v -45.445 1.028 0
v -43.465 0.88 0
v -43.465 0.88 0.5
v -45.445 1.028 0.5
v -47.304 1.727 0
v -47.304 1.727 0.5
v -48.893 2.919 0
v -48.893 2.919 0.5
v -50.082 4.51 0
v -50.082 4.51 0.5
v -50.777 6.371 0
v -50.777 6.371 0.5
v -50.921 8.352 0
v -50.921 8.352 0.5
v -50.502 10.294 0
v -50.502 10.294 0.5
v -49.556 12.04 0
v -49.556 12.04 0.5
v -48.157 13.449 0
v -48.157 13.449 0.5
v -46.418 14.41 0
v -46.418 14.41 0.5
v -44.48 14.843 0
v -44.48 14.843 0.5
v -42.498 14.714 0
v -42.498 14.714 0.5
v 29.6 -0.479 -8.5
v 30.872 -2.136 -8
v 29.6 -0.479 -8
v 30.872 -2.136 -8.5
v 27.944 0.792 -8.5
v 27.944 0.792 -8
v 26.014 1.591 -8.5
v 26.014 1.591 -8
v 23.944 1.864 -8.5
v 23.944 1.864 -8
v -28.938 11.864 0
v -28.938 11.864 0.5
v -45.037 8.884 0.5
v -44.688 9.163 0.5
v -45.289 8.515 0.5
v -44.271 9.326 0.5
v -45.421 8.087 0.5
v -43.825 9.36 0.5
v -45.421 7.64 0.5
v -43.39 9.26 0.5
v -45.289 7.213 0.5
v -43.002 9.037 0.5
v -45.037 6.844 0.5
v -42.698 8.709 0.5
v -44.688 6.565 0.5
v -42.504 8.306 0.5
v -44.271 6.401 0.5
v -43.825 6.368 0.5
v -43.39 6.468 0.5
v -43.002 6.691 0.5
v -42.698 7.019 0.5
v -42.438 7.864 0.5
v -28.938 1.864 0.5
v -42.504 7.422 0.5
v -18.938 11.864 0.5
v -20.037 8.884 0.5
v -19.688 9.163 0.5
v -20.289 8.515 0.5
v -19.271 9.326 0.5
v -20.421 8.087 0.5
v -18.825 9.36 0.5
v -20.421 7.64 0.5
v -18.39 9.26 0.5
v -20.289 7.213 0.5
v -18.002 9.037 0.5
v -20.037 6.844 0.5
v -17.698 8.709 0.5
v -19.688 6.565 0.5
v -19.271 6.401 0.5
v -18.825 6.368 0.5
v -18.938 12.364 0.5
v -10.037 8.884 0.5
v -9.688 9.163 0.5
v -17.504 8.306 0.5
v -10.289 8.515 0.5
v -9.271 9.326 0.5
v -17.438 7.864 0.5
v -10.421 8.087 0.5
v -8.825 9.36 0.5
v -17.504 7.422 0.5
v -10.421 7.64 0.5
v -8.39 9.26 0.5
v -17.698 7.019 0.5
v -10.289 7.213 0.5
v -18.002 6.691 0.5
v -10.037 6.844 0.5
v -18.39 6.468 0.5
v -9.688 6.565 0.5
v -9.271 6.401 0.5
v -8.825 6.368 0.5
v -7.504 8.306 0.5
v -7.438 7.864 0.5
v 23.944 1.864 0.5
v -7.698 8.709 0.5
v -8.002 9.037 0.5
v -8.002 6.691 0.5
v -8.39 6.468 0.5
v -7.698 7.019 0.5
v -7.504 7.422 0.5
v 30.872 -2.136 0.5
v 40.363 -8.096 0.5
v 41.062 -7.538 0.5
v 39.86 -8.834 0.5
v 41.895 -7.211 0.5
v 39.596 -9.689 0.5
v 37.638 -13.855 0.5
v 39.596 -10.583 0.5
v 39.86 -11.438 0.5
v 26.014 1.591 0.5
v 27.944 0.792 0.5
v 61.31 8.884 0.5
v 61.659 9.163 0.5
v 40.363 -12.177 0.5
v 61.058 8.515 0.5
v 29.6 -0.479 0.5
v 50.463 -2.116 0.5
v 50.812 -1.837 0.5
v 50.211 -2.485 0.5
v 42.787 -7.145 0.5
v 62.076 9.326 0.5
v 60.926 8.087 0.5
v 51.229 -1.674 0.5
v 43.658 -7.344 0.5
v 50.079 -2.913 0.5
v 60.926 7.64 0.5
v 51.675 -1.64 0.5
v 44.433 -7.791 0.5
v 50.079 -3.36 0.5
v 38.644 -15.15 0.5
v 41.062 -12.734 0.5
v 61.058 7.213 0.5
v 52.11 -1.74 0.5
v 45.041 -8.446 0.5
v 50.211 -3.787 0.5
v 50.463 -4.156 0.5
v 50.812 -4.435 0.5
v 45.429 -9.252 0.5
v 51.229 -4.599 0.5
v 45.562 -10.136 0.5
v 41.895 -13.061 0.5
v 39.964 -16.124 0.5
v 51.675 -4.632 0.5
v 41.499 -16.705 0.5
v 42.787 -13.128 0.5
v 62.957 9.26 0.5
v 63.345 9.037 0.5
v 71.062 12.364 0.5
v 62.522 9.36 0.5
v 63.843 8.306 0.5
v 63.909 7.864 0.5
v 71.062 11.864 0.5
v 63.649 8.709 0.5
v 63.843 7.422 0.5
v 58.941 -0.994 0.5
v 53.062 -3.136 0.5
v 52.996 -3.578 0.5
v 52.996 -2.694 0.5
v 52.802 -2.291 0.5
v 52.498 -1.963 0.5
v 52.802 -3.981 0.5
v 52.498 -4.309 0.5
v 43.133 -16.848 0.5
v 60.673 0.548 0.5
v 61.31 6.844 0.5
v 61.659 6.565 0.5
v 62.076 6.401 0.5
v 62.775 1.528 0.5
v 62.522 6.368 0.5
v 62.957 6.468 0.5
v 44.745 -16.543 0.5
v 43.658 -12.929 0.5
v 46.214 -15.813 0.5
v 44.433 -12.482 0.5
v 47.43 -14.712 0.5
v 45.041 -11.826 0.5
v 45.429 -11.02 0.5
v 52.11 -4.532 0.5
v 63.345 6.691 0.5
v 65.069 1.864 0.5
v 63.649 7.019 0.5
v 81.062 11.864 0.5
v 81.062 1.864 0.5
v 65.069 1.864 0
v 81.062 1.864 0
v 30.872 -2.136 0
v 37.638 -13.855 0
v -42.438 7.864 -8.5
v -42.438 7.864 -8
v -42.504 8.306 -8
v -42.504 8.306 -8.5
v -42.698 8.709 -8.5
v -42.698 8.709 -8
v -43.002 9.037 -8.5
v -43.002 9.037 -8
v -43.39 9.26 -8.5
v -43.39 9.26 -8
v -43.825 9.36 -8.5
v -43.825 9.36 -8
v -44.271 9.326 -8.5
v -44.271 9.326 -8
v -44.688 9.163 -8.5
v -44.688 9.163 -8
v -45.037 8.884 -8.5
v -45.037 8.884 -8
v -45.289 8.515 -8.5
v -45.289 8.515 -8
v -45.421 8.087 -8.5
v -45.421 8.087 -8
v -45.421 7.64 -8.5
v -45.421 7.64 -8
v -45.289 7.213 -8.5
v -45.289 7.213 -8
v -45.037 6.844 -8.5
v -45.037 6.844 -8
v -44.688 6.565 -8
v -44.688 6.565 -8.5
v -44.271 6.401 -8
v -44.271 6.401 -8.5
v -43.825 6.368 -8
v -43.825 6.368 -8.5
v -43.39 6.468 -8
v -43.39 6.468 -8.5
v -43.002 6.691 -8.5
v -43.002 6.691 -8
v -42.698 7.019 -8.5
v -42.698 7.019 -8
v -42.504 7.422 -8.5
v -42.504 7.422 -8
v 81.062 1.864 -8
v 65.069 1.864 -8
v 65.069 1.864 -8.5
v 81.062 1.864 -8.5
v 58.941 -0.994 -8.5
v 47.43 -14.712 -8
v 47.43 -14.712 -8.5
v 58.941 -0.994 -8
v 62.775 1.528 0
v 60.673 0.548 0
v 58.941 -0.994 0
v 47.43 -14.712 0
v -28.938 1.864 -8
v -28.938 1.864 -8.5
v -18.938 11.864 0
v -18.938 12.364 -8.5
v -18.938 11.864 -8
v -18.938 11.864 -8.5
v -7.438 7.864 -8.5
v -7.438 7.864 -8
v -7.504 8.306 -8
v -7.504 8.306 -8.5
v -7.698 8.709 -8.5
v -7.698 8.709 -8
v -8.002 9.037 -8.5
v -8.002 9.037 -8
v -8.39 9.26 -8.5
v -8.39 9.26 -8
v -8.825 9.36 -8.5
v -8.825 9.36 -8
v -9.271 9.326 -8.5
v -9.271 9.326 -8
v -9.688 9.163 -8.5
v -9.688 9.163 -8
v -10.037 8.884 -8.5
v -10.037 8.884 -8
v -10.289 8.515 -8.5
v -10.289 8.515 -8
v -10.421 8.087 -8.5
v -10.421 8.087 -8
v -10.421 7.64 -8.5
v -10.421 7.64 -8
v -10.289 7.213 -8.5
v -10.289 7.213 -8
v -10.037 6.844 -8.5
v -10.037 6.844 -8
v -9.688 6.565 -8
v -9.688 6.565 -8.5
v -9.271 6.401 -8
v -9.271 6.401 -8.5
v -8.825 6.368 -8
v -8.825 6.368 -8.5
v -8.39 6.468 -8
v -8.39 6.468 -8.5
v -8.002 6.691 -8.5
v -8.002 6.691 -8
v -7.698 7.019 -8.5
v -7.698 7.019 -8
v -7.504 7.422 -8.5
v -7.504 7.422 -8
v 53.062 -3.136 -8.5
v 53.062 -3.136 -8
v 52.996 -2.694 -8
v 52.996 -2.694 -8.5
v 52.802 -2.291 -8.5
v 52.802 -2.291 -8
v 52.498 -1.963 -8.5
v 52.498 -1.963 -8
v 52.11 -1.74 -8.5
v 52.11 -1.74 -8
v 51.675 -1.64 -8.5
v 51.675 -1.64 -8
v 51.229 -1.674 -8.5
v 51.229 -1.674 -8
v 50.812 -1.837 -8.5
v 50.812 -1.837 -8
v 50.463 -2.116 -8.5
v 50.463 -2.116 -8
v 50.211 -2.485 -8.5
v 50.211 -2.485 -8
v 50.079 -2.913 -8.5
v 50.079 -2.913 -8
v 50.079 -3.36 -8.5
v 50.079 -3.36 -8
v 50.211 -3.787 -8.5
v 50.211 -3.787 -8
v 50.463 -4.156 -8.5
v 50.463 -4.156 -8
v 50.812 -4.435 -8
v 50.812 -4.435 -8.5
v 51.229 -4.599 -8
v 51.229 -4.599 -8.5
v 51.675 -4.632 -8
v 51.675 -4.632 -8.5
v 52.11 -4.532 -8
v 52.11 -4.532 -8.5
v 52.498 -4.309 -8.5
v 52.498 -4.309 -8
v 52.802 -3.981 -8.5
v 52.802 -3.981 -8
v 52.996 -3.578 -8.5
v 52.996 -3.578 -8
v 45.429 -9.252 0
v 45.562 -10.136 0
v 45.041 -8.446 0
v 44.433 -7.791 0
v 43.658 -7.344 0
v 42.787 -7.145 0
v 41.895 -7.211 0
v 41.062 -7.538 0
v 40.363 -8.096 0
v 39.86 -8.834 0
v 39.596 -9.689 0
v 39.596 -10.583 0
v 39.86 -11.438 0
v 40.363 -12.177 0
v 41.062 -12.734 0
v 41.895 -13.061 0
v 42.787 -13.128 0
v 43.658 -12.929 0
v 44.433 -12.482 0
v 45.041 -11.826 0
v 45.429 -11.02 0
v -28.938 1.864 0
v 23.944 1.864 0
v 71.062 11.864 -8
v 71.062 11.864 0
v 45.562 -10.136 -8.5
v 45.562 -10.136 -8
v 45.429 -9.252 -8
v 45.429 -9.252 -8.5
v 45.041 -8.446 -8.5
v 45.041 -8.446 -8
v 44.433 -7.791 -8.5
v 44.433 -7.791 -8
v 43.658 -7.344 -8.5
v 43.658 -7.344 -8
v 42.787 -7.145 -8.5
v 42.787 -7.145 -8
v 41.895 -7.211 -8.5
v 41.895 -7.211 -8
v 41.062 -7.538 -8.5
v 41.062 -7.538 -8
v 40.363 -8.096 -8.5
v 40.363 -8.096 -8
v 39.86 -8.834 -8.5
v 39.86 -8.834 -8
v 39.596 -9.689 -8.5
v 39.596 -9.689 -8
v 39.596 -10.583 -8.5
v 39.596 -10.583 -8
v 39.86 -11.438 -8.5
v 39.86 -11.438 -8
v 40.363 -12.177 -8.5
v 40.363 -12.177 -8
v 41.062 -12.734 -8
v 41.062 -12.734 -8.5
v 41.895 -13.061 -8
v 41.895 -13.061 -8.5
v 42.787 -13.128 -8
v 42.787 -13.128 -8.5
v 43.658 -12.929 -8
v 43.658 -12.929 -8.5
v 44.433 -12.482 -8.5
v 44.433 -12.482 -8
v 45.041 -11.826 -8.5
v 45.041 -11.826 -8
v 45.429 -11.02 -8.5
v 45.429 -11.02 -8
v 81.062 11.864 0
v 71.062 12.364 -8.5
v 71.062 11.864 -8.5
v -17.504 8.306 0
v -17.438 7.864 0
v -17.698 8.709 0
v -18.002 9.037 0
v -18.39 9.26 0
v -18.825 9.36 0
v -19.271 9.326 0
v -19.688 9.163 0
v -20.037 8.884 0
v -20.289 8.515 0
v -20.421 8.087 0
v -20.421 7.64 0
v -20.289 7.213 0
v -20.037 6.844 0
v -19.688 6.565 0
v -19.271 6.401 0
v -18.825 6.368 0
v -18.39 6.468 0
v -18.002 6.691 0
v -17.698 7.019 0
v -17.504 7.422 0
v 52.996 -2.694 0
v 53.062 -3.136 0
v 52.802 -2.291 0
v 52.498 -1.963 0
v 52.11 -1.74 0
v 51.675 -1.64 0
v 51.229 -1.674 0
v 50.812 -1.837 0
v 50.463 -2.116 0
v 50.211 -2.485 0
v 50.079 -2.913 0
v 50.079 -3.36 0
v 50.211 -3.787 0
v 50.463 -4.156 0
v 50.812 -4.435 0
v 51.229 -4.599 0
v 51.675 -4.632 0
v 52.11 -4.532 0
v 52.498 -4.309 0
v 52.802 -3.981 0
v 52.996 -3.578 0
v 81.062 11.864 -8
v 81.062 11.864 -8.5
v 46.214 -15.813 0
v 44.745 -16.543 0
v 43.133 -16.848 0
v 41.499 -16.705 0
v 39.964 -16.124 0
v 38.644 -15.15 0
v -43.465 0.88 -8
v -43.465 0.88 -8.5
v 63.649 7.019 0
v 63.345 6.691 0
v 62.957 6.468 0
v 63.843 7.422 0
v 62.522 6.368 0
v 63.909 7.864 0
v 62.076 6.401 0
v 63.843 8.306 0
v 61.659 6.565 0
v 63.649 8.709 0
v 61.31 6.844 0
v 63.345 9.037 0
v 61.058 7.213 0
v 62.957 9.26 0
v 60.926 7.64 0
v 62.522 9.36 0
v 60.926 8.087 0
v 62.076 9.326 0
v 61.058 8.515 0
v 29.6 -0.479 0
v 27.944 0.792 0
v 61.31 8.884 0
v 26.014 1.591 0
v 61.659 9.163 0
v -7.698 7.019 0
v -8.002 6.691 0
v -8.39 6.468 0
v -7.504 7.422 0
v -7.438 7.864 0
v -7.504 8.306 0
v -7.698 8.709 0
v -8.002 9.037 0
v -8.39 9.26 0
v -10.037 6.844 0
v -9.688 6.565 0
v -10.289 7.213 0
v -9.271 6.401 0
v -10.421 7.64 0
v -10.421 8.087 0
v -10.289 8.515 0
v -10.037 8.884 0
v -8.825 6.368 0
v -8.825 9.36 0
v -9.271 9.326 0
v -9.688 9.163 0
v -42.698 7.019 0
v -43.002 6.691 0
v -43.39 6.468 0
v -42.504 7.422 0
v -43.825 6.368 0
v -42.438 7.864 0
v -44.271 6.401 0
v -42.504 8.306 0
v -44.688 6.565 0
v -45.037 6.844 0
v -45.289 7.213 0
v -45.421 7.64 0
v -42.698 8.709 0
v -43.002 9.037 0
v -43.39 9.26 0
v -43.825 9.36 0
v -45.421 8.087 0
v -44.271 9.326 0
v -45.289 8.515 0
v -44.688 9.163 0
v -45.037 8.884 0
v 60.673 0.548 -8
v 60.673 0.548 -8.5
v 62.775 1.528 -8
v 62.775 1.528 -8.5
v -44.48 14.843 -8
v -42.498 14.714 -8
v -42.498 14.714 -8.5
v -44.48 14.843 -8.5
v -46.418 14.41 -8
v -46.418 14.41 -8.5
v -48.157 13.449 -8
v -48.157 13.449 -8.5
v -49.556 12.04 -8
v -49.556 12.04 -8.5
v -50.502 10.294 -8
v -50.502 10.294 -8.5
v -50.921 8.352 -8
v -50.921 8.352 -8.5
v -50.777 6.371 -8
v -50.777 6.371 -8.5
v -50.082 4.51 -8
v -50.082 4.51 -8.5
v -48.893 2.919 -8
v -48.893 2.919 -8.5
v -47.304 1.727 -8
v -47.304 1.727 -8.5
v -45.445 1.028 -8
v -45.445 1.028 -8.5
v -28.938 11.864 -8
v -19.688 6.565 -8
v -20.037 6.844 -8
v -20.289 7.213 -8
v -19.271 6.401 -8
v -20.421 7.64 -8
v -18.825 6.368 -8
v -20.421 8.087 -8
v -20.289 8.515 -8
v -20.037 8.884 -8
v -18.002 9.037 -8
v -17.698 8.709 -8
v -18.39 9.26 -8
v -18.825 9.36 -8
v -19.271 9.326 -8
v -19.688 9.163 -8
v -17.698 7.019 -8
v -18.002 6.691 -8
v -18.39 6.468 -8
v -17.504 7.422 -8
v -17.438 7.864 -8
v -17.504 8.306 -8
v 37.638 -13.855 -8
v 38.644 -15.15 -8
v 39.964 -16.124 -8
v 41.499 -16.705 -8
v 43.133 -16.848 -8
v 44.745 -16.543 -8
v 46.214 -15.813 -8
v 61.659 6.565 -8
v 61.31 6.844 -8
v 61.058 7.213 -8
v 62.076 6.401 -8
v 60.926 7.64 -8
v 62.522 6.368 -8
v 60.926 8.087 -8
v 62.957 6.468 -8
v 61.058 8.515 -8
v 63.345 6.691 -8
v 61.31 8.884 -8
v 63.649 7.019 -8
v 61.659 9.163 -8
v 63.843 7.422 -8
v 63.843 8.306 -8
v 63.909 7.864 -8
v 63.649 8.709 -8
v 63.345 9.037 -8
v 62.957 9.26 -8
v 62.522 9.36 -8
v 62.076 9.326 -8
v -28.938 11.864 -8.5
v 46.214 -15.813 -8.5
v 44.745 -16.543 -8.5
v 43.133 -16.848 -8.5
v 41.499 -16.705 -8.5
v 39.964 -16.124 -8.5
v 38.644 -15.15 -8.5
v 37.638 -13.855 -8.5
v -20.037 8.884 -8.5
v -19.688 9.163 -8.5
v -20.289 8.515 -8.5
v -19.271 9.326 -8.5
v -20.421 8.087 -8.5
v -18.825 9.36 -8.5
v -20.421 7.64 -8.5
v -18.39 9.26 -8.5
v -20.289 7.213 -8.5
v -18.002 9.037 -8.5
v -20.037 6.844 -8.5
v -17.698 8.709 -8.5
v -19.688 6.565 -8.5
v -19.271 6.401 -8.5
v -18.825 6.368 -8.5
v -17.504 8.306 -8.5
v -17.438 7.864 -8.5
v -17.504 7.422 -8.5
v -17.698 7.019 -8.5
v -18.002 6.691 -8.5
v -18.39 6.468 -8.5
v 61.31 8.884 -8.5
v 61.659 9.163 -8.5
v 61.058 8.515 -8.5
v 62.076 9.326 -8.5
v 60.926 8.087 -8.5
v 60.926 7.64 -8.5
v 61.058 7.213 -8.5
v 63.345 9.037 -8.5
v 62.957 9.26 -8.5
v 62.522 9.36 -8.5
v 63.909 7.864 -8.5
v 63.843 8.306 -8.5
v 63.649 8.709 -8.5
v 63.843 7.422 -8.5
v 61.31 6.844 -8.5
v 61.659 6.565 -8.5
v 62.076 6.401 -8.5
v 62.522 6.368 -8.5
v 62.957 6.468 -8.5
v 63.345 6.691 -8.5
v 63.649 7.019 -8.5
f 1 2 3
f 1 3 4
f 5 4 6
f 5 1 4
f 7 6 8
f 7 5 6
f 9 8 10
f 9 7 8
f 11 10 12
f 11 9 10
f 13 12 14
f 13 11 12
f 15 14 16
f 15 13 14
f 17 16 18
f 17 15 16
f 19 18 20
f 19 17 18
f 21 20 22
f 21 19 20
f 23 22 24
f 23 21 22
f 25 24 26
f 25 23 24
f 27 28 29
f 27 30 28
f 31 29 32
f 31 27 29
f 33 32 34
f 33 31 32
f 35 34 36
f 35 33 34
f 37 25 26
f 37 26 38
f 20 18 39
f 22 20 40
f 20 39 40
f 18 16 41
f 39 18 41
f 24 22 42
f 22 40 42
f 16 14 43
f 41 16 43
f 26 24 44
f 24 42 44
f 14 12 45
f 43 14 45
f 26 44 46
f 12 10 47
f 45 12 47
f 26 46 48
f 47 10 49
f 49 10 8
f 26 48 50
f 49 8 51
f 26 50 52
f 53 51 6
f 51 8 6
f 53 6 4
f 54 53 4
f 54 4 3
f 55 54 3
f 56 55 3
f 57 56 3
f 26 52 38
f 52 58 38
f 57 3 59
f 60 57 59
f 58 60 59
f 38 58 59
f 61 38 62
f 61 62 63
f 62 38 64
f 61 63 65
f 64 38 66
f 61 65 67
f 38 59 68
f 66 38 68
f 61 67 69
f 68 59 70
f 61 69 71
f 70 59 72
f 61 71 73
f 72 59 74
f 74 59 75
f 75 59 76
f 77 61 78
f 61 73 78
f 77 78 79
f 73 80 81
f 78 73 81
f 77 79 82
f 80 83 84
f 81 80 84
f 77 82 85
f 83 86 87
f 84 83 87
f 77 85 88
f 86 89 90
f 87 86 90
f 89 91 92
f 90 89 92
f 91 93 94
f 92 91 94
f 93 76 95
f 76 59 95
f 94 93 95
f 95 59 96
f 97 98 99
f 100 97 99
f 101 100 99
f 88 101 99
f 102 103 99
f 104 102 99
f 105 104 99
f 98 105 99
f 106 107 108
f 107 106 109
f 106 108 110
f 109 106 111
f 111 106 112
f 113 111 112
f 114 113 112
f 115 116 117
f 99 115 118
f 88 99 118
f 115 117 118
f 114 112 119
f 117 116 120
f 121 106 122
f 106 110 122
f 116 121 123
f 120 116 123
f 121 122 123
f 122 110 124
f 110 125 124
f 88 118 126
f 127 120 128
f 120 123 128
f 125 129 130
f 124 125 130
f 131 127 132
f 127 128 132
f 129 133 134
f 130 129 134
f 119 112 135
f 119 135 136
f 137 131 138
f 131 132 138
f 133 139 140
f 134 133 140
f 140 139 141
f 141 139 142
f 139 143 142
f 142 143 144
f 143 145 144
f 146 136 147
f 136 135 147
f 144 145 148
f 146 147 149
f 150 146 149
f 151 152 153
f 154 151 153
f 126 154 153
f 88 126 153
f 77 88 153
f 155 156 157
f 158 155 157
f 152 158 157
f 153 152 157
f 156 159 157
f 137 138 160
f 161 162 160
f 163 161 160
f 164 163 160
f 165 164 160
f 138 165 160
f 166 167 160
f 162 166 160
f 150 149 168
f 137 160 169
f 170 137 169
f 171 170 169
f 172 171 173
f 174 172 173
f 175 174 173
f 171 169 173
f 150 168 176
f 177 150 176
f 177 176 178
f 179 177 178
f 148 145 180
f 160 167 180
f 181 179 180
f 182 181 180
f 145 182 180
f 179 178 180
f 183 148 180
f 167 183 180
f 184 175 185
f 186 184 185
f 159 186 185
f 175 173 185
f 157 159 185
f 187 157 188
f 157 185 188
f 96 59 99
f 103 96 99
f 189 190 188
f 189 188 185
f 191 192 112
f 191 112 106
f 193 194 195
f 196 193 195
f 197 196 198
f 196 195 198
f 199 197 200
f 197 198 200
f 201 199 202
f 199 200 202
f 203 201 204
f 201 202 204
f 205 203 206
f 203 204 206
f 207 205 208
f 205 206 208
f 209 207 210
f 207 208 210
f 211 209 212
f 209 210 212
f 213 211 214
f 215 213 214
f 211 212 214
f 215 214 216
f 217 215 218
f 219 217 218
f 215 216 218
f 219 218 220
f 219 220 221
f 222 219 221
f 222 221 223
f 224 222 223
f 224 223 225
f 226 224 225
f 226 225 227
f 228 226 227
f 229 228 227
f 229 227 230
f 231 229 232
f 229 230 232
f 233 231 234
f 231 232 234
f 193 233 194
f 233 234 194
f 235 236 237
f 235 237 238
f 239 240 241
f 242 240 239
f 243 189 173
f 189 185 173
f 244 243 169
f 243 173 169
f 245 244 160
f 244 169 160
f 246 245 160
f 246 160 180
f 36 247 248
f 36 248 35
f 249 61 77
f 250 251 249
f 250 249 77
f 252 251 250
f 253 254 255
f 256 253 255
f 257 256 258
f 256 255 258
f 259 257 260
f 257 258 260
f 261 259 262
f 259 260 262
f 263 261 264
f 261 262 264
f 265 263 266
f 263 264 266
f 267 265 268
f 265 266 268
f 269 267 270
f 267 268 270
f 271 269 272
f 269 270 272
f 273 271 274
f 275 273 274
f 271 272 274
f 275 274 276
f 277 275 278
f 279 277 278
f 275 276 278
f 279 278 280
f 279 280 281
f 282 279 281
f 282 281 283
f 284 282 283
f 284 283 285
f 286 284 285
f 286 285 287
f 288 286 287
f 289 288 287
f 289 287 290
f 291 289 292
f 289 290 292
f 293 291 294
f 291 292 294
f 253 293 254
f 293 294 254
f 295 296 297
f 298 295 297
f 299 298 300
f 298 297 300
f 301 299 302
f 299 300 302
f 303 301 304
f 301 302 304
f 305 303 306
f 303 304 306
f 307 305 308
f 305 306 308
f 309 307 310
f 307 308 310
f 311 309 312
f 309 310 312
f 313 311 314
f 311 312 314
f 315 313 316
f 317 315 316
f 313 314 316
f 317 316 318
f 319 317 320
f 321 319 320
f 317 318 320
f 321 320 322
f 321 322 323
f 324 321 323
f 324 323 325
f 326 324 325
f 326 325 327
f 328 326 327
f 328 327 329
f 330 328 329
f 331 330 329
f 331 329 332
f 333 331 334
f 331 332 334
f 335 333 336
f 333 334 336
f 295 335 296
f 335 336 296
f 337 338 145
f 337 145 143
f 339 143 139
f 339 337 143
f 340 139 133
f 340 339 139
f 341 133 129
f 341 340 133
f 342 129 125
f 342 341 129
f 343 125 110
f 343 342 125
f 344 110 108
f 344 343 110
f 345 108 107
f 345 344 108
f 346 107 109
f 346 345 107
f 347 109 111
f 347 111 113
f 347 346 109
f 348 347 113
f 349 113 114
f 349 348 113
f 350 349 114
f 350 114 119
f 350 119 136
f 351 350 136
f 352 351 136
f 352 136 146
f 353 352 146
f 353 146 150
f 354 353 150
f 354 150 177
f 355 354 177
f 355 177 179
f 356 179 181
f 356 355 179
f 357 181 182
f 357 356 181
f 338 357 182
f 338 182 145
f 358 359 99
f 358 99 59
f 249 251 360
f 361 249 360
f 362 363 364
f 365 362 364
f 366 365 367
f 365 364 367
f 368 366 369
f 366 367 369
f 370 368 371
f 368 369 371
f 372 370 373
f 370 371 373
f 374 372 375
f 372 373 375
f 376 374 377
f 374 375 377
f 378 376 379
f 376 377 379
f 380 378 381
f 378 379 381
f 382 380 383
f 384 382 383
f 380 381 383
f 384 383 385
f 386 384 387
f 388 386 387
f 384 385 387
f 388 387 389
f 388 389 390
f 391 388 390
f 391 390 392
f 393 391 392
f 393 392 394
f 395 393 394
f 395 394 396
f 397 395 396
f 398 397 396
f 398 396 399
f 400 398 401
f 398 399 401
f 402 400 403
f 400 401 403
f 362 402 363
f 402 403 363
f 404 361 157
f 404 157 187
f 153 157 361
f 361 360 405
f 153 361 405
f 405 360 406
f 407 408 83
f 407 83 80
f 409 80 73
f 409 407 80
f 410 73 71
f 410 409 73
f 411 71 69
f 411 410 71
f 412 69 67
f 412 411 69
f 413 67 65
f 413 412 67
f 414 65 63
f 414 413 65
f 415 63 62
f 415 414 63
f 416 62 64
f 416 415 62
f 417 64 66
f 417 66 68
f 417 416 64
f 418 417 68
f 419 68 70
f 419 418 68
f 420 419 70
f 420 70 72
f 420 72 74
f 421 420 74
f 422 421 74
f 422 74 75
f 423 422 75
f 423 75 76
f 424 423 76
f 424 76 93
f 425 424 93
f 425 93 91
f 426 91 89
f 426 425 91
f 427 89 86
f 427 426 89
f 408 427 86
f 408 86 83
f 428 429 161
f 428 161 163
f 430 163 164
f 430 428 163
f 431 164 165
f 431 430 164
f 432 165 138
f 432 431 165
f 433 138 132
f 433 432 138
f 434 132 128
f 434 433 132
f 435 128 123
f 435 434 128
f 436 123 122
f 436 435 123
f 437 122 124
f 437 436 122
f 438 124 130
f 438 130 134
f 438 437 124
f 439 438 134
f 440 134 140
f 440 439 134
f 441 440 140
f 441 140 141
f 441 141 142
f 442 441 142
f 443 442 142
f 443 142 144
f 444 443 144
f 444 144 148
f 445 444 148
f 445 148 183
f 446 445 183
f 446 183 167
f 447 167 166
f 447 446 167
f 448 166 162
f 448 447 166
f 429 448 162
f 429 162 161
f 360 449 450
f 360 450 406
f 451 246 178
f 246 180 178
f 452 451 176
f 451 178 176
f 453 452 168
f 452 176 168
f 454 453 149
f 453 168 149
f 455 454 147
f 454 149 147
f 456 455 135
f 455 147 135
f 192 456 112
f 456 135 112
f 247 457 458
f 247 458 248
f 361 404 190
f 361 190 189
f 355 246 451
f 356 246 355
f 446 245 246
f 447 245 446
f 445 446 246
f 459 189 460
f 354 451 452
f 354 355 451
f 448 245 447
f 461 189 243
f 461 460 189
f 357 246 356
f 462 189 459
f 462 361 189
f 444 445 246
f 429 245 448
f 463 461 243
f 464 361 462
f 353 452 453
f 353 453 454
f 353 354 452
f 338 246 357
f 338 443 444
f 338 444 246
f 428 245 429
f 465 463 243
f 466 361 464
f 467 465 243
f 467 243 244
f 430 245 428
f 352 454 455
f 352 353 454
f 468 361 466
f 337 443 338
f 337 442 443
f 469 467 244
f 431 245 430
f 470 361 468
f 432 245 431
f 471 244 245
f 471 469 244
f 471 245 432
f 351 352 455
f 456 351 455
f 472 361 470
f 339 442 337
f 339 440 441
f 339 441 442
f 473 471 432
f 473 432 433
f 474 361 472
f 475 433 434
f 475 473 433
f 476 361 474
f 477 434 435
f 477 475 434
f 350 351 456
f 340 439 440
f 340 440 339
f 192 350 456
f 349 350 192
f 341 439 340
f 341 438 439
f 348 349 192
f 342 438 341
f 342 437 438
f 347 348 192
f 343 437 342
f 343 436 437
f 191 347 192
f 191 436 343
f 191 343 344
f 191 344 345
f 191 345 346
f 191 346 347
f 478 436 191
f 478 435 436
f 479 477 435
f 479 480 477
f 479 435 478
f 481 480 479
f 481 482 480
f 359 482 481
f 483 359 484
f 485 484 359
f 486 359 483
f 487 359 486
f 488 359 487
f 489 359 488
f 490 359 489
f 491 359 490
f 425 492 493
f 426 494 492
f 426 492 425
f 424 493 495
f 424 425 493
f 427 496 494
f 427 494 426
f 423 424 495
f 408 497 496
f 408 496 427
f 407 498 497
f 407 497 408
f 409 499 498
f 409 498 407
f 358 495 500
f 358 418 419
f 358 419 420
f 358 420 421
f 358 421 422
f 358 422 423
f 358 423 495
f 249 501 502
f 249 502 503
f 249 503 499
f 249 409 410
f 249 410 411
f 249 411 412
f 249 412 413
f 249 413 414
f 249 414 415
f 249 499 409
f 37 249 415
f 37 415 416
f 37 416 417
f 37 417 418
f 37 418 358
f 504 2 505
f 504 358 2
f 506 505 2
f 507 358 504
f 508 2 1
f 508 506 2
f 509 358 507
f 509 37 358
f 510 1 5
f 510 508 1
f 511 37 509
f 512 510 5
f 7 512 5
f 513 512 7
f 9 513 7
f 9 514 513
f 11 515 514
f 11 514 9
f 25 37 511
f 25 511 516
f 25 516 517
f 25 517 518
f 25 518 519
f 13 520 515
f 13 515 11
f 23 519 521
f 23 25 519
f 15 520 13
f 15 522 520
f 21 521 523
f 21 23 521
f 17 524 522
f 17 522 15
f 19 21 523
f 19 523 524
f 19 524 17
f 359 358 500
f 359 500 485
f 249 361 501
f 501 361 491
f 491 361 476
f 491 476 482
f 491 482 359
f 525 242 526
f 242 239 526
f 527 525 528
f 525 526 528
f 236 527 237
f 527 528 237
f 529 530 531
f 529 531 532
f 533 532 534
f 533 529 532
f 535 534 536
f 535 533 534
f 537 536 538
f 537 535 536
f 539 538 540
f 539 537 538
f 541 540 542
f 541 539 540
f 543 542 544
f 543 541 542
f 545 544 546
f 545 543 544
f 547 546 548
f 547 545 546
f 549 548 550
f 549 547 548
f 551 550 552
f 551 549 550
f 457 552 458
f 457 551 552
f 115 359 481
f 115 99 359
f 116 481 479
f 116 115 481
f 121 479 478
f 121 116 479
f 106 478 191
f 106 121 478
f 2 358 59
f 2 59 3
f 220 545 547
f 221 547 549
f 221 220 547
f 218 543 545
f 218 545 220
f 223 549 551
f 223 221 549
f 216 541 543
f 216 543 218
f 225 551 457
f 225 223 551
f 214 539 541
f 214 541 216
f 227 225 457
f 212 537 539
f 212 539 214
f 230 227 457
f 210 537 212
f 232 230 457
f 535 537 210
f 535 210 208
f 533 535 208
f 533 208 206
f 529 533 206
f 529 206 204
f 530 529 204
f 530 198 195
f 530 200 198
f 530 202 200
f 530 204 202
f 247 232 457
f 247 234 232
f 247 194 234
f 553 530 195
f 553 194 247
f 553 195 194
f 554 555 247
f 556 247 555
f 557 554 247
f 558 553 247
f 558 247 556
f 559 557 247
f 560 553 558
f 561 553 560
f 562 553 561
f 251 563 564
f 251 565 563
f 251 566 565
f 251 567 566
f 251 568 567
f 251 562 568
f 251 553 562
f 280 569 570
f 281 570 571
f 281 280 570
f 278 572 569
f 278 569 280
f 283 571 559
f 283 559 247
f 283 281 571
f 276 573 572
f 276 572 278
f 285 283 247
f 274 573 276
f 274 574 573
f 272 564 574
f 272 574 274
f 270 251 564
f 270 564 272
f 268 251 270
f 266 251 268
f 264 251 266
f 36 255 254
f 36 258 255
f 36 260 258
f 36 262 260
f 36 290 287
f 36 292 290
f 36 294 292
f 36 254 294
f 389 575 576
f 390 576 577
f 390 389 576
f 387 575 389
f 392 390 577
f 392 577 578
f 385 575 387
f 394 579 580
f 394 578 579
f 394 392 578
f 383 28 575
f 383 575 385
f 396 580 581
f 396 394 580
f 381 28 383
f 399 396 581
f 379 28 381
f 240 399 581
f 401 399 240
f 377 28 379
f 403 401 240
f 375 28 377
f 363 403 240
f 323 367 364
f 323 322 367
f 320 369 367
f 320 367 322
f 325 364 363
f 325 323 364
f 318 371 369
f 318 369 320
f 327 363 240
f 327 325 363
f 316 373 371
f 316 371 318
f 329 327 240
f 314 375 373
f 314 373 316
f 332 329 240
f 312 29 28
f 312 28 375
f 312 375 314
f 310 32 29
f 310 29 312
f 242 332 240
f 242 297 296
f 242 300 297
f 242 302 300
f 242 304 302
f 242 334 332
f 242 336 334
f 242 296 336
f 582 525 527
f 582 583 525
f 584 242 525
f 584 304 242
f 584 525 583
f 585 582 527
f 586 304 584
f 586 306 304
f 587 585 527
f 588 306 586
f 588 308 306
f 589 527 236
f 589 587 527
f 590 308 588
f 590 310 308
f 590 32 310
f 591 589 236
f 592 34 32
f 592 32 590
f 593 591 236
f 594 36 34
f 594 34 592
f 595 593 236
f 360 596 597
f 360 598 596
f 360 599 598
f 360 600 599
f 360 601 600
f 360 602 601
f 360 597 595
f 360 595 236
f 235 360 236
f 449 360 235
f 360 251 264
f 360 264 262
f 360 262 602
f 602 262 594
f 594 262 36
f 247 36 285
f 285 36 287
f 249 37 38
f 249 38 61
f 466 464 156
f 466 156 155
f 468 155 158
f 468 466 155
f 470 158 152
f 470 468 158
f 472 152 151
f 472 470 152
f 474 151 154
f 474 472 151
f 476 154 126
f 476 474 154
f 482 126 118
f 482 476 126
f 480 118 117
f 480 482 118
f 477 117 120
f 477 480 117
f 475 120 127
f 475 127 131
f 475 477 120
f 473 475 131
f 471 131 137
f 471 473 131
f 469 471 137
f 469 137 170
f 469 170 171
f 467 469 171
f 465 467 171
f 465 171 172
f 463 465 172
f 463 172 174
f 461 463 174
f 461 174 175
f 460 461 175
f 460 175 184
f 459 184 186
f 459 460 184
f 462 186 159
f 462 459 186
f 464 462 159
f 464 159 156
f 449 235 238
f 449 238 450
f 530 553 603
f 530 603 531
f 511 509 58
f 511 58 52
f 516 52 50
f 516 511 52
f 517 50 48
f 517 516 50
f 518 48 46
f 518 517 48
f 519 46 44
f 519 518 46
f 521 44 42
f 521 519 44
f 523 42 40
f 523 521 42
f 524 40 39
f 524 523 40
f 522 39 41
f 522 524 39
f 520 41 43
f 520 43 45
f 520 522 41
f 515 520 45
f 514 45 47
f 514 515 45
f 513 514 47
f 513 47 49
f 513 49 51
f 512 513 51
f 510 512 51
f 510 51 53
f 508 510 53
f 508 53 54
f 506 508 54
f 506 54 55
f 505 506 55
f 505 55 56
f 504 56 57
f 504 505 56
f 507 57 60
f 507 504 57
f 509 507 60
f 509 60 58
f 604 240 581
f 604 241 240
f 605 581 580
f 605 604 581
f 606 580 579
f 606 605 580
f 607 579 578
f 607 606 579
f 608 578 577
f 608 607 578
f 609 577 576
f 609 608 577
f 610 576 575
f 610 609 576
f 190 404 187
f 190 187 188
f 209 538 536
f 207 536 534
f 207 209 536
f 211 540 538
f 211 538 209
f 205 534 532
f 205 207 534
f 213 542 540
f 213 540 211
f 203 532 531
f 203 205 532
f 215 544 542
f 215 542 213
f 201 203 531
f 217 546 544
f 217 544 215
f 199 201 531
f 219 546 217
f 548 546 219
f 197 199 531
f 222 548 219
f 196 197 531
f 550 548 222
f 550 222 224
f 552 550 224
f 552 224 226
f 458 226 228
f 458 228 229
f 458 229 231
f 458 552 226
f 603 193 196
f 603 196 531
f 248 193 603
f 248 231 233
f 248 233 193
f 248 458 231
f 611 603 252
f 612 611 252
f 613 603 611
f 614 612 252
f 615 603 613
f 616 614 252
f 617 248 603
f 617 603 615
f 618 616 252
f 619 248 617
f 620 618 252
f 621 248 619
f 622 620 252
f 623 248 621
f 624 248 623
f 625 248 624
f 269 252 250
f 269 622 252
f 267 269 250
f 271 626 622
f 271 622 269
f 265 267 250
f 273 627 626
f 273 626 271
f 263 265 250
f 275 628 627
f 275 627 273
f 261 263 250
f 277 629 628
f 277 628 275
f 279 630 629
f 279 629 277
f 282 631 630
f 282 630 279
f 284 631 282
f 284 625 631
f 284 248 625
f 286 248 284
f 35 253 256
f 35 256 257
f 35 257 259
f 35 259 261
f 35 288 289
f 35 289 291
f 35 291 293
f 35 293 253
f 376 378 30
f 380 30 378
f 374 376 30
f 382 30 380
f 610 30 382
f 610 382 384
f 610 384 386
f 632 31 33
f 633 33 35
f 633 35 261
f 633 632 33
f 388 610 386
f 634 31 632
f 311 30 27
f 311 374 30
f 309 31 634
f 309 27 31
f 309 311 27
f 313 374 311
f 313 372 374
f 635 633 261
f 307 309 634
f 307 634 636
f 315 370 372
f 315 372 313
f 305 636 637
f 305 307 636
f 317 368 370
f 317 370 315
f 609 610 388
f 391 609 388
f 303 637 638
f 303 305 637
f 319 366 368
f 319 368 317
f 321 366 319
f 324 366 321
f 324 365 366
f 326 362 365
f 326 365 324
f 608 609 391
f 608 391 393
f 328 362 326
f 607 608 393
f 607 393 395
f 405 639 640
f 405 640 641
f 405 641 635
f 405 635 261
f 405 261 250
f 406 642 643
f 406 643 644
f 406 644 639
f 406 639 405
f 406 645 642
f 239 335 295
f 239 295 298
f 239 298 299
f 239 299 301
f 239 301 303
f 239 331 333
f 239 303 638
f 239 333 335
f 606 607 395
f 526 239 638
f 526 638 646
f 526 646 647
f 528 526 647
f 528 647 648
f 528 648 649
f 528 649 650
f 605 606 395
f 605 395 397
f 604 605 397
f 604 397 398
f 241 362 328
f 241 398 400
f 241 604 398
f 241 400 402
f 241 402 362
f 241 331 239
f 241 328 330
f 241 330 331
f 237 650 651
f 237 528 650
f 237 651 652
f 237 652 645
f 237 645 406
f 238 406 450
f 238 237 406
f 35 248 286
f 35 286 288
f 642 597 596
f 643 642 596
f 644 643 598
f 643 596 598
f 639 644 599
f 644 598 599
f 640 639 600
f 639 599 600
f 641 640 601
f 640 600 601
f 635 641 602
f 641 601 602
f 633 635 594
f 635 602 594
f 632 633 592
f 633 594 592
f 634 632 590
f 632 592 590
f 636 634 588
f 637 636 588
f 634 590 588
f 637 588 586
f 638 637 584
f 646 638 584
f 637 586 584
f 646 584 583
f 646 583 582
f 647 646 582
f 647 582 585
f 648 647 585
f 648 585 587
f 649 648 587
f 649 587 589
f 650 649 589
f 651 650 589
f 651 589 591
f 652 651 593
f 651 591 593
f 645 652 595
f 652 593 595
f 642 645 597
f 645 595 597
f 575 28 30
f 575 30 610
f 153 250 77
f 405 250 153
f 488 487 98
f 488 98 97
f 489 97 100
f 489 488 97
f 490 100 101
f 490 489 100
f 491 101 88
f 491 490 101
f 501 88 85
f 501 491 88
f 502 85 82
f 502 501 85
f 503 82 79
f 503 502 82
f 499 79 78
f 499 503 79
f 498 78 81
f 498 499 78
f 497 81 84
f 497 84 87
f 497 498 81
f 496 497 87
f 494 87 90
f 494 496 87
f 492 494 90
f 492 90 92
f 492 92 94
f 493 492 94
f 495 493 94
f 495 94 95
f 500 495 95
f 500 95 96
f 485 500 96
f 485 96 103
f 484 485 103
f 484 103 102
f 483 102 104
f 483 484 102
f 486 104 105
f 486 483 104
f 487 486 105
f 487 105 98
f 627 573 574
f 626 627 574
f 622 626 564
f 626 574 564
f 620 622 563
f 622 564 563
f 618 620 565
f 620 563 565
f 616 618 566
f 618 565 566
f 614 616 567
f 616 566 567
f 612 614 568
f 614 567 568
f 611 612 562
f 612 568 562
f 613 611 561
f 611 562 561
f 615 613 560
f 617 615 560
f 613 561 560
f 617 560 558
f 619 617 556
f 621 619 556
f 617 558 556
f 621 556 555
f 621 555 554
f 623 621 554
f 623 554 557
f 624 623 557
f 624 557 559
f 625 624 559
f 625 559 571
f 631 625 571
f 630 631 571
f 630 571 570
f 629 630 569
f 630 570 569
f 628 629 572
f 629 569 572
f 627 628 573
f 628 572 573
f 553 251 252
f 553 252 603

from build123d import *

# Parameters (mm, degrees)
SKETCH_1_R      = 1.5
SKETCH_1_R_2    = 3
EXTRUDE_1_DEPTH = 0.5
SKETCH_3_R      = 1.5
SKETCH_3_R_2    = 3
EXTRUDE_2_DEPTH = 0.5
SKETCH_4_W      = 90
SKETCH_4_H      = 9
EXTRUDE_3_DEPTH = 0.5
FILLET_1_R      = 8
FILLET_2_R      = 6


with BuildPart() as part:
    # 草图1 → 凸台-拉伸1 (new body)
    with BuildSketch(Plane.XY):
        with BuildLine():
            Line((-28.937588447, 11.863865809), (81.062411553, 11.863865809))
            Line((81.062411553, 11.863865809), (81.062411553, 1.863865809))
            Line((81.062411553, 1.863865809), (61.338833841, 1.863865809))
            Line((61.338833841, 1.863865809), (41.922203683, -21.275972939))
            Line((41.922203683, -21.275972939), (28.562411553, 1.863865809))
            Line((28.562411553, 1.863865809), (-28.937588447, 1.863865809))
            Line((-28.937588447, 1.863865809), (-43.464520366, 0.879869346))
            ThreePointArc((-43.464520366, 0.879869346), (-50.920555651, 8.351891461), (-42.497668866, 14.714167379))
            Line((-42.497668866, 14.714167379), (-28.937588447, 11.863865809))
        make_face()
        with Locations((-43.937588447, 7.863865809)):
            Circle(SKETCH_1_R, mode=Mode.SUBTRACT)
        with Locations((42.562411553, -10.136134191)):
            Circle(SKETCH_1_R_2, mode=Mode.SUBTRACT)
        with Locations((51.562411553, -3.136134191)):
            Circle(SKETCH_1_R, mode=Mode.SUBTRACT)
        with Locations((-18.937588447, 7.863865809)):
            Circle(SKETCH_1_R, mode=Mode.SUBTRACT)
        with Locations((-8.937588447, 7.863865809)):
            Circle(SKETCH_1_R, mode=Mode.SUBTRACT)
        with Locations((62.409410938, 7.863865809)):
            Circle(SKETCH_1_R, mode=Mode.SUBTRACT)
    extrude(amount=EXTRUDE_1_DEPTH)



with BuildPart() as body_2:
    # 草图3 → 凸台-拉伸2 (new body)
    with BuildSketch(Plane.XY.offset(-8)):
        with BuildLine():
            Line((41.922203683, -21.275972939), (61.338833841, 1.863865809))
            Line((61.338833841, 1.863865809), (81.062411553, 1.863865809))
            Line((81.062411553, 1.863865809), (81.062411553, 11.863865809))
            Line((81.062411553, 11.863865809), (-28.937588447, 11.863865809))
            Line((-28.937588447, 11.863865809), (-42.497668866, 14.714167379))
            ThreePointArc((-42.497668866, 14.714167379), (-50.920555651, 8.351891461), (-43.464520366, 0.879869346))
            Line((-43.464520366, 0.879869346), (-28.937588447, 1.863865809))
            Line((-28.937588447, 1.863865809), (28.562411553, 1.863865809))
            Line((28.562411553, 1.863865809), (41.922203683, -21.275972939))
        make_face()
        with Locations((51.562411553, -3.136134191)):
            Circle(SKETCH_3_R, mode=Mode.SUBTRACT)
        with Locations((42.562411553, -10.136134191)):
            Circle(SKETCH_3_R_2, mode=Mode.SUBTRACT)
        with Locations((-43.937588447, 7.863865809)):
            Circle(SKETCH_3_R, mode=Mode.SUBTRACT)
        with Locations((62.409410938, 7.863865809)):
            Circle(SKETCH_3_R, mode=Mode.SUBTRACT)
        with Locations((-8.937588447, 7.863865809)):
            Circle(SKETCH_3_R, mode=Mode.SUBTRACT)
        with Locations((-18.937588447, 7.863865809)):
            Circle(SKETCH_3_R, mode=Mode.SUBTRACT)
    extrude(amount=-EXTRUDE_2_DEPTH)


with BuildPart() as part_1:
    add(part.part)

    add(body_2.part)  # 凸台-拉伸3 merges body 2
    # 草图4 → 凸台-拉伸3 (add)
    with BuildSketch(Plane(origin=(0, 11.863865809, 0), x_dir=(1, 0, 0), z_dir=(0, 1, 0))):
        with Locations((26.062411553, 4)):
            Rectangle(SKETCH_4_W, SKETCH_4_H)
    extrude(amount=EXTRUDE_3_DEPTH)

    # 圆角1
    fillet_1_edges = [part_1.edges().sort_by_distance(p)[0] for p in [
        (61.338833841, 1.863865809, 0.25),
        (28.562411553, 1.863865809, 0.25),
        (28.562411553, 1.863865809, -8.25),
        (61.338833841, 1.863865809, -8.25),
    ]]
    fillet(fillet_1_edges, radius=FILLET_1_R)

    # 圆角2
    fillet_2_edges = [part_1.edges().sort_by_distance(p)[0] for p in [
        (41.922203683, -21.275972939, 0.25),
        (41.922203683, -21.275972939, -8.25),
    ]]
    fillet(fillet_2_edges, radius=FILLET_2_R)


solid = part_1.part
